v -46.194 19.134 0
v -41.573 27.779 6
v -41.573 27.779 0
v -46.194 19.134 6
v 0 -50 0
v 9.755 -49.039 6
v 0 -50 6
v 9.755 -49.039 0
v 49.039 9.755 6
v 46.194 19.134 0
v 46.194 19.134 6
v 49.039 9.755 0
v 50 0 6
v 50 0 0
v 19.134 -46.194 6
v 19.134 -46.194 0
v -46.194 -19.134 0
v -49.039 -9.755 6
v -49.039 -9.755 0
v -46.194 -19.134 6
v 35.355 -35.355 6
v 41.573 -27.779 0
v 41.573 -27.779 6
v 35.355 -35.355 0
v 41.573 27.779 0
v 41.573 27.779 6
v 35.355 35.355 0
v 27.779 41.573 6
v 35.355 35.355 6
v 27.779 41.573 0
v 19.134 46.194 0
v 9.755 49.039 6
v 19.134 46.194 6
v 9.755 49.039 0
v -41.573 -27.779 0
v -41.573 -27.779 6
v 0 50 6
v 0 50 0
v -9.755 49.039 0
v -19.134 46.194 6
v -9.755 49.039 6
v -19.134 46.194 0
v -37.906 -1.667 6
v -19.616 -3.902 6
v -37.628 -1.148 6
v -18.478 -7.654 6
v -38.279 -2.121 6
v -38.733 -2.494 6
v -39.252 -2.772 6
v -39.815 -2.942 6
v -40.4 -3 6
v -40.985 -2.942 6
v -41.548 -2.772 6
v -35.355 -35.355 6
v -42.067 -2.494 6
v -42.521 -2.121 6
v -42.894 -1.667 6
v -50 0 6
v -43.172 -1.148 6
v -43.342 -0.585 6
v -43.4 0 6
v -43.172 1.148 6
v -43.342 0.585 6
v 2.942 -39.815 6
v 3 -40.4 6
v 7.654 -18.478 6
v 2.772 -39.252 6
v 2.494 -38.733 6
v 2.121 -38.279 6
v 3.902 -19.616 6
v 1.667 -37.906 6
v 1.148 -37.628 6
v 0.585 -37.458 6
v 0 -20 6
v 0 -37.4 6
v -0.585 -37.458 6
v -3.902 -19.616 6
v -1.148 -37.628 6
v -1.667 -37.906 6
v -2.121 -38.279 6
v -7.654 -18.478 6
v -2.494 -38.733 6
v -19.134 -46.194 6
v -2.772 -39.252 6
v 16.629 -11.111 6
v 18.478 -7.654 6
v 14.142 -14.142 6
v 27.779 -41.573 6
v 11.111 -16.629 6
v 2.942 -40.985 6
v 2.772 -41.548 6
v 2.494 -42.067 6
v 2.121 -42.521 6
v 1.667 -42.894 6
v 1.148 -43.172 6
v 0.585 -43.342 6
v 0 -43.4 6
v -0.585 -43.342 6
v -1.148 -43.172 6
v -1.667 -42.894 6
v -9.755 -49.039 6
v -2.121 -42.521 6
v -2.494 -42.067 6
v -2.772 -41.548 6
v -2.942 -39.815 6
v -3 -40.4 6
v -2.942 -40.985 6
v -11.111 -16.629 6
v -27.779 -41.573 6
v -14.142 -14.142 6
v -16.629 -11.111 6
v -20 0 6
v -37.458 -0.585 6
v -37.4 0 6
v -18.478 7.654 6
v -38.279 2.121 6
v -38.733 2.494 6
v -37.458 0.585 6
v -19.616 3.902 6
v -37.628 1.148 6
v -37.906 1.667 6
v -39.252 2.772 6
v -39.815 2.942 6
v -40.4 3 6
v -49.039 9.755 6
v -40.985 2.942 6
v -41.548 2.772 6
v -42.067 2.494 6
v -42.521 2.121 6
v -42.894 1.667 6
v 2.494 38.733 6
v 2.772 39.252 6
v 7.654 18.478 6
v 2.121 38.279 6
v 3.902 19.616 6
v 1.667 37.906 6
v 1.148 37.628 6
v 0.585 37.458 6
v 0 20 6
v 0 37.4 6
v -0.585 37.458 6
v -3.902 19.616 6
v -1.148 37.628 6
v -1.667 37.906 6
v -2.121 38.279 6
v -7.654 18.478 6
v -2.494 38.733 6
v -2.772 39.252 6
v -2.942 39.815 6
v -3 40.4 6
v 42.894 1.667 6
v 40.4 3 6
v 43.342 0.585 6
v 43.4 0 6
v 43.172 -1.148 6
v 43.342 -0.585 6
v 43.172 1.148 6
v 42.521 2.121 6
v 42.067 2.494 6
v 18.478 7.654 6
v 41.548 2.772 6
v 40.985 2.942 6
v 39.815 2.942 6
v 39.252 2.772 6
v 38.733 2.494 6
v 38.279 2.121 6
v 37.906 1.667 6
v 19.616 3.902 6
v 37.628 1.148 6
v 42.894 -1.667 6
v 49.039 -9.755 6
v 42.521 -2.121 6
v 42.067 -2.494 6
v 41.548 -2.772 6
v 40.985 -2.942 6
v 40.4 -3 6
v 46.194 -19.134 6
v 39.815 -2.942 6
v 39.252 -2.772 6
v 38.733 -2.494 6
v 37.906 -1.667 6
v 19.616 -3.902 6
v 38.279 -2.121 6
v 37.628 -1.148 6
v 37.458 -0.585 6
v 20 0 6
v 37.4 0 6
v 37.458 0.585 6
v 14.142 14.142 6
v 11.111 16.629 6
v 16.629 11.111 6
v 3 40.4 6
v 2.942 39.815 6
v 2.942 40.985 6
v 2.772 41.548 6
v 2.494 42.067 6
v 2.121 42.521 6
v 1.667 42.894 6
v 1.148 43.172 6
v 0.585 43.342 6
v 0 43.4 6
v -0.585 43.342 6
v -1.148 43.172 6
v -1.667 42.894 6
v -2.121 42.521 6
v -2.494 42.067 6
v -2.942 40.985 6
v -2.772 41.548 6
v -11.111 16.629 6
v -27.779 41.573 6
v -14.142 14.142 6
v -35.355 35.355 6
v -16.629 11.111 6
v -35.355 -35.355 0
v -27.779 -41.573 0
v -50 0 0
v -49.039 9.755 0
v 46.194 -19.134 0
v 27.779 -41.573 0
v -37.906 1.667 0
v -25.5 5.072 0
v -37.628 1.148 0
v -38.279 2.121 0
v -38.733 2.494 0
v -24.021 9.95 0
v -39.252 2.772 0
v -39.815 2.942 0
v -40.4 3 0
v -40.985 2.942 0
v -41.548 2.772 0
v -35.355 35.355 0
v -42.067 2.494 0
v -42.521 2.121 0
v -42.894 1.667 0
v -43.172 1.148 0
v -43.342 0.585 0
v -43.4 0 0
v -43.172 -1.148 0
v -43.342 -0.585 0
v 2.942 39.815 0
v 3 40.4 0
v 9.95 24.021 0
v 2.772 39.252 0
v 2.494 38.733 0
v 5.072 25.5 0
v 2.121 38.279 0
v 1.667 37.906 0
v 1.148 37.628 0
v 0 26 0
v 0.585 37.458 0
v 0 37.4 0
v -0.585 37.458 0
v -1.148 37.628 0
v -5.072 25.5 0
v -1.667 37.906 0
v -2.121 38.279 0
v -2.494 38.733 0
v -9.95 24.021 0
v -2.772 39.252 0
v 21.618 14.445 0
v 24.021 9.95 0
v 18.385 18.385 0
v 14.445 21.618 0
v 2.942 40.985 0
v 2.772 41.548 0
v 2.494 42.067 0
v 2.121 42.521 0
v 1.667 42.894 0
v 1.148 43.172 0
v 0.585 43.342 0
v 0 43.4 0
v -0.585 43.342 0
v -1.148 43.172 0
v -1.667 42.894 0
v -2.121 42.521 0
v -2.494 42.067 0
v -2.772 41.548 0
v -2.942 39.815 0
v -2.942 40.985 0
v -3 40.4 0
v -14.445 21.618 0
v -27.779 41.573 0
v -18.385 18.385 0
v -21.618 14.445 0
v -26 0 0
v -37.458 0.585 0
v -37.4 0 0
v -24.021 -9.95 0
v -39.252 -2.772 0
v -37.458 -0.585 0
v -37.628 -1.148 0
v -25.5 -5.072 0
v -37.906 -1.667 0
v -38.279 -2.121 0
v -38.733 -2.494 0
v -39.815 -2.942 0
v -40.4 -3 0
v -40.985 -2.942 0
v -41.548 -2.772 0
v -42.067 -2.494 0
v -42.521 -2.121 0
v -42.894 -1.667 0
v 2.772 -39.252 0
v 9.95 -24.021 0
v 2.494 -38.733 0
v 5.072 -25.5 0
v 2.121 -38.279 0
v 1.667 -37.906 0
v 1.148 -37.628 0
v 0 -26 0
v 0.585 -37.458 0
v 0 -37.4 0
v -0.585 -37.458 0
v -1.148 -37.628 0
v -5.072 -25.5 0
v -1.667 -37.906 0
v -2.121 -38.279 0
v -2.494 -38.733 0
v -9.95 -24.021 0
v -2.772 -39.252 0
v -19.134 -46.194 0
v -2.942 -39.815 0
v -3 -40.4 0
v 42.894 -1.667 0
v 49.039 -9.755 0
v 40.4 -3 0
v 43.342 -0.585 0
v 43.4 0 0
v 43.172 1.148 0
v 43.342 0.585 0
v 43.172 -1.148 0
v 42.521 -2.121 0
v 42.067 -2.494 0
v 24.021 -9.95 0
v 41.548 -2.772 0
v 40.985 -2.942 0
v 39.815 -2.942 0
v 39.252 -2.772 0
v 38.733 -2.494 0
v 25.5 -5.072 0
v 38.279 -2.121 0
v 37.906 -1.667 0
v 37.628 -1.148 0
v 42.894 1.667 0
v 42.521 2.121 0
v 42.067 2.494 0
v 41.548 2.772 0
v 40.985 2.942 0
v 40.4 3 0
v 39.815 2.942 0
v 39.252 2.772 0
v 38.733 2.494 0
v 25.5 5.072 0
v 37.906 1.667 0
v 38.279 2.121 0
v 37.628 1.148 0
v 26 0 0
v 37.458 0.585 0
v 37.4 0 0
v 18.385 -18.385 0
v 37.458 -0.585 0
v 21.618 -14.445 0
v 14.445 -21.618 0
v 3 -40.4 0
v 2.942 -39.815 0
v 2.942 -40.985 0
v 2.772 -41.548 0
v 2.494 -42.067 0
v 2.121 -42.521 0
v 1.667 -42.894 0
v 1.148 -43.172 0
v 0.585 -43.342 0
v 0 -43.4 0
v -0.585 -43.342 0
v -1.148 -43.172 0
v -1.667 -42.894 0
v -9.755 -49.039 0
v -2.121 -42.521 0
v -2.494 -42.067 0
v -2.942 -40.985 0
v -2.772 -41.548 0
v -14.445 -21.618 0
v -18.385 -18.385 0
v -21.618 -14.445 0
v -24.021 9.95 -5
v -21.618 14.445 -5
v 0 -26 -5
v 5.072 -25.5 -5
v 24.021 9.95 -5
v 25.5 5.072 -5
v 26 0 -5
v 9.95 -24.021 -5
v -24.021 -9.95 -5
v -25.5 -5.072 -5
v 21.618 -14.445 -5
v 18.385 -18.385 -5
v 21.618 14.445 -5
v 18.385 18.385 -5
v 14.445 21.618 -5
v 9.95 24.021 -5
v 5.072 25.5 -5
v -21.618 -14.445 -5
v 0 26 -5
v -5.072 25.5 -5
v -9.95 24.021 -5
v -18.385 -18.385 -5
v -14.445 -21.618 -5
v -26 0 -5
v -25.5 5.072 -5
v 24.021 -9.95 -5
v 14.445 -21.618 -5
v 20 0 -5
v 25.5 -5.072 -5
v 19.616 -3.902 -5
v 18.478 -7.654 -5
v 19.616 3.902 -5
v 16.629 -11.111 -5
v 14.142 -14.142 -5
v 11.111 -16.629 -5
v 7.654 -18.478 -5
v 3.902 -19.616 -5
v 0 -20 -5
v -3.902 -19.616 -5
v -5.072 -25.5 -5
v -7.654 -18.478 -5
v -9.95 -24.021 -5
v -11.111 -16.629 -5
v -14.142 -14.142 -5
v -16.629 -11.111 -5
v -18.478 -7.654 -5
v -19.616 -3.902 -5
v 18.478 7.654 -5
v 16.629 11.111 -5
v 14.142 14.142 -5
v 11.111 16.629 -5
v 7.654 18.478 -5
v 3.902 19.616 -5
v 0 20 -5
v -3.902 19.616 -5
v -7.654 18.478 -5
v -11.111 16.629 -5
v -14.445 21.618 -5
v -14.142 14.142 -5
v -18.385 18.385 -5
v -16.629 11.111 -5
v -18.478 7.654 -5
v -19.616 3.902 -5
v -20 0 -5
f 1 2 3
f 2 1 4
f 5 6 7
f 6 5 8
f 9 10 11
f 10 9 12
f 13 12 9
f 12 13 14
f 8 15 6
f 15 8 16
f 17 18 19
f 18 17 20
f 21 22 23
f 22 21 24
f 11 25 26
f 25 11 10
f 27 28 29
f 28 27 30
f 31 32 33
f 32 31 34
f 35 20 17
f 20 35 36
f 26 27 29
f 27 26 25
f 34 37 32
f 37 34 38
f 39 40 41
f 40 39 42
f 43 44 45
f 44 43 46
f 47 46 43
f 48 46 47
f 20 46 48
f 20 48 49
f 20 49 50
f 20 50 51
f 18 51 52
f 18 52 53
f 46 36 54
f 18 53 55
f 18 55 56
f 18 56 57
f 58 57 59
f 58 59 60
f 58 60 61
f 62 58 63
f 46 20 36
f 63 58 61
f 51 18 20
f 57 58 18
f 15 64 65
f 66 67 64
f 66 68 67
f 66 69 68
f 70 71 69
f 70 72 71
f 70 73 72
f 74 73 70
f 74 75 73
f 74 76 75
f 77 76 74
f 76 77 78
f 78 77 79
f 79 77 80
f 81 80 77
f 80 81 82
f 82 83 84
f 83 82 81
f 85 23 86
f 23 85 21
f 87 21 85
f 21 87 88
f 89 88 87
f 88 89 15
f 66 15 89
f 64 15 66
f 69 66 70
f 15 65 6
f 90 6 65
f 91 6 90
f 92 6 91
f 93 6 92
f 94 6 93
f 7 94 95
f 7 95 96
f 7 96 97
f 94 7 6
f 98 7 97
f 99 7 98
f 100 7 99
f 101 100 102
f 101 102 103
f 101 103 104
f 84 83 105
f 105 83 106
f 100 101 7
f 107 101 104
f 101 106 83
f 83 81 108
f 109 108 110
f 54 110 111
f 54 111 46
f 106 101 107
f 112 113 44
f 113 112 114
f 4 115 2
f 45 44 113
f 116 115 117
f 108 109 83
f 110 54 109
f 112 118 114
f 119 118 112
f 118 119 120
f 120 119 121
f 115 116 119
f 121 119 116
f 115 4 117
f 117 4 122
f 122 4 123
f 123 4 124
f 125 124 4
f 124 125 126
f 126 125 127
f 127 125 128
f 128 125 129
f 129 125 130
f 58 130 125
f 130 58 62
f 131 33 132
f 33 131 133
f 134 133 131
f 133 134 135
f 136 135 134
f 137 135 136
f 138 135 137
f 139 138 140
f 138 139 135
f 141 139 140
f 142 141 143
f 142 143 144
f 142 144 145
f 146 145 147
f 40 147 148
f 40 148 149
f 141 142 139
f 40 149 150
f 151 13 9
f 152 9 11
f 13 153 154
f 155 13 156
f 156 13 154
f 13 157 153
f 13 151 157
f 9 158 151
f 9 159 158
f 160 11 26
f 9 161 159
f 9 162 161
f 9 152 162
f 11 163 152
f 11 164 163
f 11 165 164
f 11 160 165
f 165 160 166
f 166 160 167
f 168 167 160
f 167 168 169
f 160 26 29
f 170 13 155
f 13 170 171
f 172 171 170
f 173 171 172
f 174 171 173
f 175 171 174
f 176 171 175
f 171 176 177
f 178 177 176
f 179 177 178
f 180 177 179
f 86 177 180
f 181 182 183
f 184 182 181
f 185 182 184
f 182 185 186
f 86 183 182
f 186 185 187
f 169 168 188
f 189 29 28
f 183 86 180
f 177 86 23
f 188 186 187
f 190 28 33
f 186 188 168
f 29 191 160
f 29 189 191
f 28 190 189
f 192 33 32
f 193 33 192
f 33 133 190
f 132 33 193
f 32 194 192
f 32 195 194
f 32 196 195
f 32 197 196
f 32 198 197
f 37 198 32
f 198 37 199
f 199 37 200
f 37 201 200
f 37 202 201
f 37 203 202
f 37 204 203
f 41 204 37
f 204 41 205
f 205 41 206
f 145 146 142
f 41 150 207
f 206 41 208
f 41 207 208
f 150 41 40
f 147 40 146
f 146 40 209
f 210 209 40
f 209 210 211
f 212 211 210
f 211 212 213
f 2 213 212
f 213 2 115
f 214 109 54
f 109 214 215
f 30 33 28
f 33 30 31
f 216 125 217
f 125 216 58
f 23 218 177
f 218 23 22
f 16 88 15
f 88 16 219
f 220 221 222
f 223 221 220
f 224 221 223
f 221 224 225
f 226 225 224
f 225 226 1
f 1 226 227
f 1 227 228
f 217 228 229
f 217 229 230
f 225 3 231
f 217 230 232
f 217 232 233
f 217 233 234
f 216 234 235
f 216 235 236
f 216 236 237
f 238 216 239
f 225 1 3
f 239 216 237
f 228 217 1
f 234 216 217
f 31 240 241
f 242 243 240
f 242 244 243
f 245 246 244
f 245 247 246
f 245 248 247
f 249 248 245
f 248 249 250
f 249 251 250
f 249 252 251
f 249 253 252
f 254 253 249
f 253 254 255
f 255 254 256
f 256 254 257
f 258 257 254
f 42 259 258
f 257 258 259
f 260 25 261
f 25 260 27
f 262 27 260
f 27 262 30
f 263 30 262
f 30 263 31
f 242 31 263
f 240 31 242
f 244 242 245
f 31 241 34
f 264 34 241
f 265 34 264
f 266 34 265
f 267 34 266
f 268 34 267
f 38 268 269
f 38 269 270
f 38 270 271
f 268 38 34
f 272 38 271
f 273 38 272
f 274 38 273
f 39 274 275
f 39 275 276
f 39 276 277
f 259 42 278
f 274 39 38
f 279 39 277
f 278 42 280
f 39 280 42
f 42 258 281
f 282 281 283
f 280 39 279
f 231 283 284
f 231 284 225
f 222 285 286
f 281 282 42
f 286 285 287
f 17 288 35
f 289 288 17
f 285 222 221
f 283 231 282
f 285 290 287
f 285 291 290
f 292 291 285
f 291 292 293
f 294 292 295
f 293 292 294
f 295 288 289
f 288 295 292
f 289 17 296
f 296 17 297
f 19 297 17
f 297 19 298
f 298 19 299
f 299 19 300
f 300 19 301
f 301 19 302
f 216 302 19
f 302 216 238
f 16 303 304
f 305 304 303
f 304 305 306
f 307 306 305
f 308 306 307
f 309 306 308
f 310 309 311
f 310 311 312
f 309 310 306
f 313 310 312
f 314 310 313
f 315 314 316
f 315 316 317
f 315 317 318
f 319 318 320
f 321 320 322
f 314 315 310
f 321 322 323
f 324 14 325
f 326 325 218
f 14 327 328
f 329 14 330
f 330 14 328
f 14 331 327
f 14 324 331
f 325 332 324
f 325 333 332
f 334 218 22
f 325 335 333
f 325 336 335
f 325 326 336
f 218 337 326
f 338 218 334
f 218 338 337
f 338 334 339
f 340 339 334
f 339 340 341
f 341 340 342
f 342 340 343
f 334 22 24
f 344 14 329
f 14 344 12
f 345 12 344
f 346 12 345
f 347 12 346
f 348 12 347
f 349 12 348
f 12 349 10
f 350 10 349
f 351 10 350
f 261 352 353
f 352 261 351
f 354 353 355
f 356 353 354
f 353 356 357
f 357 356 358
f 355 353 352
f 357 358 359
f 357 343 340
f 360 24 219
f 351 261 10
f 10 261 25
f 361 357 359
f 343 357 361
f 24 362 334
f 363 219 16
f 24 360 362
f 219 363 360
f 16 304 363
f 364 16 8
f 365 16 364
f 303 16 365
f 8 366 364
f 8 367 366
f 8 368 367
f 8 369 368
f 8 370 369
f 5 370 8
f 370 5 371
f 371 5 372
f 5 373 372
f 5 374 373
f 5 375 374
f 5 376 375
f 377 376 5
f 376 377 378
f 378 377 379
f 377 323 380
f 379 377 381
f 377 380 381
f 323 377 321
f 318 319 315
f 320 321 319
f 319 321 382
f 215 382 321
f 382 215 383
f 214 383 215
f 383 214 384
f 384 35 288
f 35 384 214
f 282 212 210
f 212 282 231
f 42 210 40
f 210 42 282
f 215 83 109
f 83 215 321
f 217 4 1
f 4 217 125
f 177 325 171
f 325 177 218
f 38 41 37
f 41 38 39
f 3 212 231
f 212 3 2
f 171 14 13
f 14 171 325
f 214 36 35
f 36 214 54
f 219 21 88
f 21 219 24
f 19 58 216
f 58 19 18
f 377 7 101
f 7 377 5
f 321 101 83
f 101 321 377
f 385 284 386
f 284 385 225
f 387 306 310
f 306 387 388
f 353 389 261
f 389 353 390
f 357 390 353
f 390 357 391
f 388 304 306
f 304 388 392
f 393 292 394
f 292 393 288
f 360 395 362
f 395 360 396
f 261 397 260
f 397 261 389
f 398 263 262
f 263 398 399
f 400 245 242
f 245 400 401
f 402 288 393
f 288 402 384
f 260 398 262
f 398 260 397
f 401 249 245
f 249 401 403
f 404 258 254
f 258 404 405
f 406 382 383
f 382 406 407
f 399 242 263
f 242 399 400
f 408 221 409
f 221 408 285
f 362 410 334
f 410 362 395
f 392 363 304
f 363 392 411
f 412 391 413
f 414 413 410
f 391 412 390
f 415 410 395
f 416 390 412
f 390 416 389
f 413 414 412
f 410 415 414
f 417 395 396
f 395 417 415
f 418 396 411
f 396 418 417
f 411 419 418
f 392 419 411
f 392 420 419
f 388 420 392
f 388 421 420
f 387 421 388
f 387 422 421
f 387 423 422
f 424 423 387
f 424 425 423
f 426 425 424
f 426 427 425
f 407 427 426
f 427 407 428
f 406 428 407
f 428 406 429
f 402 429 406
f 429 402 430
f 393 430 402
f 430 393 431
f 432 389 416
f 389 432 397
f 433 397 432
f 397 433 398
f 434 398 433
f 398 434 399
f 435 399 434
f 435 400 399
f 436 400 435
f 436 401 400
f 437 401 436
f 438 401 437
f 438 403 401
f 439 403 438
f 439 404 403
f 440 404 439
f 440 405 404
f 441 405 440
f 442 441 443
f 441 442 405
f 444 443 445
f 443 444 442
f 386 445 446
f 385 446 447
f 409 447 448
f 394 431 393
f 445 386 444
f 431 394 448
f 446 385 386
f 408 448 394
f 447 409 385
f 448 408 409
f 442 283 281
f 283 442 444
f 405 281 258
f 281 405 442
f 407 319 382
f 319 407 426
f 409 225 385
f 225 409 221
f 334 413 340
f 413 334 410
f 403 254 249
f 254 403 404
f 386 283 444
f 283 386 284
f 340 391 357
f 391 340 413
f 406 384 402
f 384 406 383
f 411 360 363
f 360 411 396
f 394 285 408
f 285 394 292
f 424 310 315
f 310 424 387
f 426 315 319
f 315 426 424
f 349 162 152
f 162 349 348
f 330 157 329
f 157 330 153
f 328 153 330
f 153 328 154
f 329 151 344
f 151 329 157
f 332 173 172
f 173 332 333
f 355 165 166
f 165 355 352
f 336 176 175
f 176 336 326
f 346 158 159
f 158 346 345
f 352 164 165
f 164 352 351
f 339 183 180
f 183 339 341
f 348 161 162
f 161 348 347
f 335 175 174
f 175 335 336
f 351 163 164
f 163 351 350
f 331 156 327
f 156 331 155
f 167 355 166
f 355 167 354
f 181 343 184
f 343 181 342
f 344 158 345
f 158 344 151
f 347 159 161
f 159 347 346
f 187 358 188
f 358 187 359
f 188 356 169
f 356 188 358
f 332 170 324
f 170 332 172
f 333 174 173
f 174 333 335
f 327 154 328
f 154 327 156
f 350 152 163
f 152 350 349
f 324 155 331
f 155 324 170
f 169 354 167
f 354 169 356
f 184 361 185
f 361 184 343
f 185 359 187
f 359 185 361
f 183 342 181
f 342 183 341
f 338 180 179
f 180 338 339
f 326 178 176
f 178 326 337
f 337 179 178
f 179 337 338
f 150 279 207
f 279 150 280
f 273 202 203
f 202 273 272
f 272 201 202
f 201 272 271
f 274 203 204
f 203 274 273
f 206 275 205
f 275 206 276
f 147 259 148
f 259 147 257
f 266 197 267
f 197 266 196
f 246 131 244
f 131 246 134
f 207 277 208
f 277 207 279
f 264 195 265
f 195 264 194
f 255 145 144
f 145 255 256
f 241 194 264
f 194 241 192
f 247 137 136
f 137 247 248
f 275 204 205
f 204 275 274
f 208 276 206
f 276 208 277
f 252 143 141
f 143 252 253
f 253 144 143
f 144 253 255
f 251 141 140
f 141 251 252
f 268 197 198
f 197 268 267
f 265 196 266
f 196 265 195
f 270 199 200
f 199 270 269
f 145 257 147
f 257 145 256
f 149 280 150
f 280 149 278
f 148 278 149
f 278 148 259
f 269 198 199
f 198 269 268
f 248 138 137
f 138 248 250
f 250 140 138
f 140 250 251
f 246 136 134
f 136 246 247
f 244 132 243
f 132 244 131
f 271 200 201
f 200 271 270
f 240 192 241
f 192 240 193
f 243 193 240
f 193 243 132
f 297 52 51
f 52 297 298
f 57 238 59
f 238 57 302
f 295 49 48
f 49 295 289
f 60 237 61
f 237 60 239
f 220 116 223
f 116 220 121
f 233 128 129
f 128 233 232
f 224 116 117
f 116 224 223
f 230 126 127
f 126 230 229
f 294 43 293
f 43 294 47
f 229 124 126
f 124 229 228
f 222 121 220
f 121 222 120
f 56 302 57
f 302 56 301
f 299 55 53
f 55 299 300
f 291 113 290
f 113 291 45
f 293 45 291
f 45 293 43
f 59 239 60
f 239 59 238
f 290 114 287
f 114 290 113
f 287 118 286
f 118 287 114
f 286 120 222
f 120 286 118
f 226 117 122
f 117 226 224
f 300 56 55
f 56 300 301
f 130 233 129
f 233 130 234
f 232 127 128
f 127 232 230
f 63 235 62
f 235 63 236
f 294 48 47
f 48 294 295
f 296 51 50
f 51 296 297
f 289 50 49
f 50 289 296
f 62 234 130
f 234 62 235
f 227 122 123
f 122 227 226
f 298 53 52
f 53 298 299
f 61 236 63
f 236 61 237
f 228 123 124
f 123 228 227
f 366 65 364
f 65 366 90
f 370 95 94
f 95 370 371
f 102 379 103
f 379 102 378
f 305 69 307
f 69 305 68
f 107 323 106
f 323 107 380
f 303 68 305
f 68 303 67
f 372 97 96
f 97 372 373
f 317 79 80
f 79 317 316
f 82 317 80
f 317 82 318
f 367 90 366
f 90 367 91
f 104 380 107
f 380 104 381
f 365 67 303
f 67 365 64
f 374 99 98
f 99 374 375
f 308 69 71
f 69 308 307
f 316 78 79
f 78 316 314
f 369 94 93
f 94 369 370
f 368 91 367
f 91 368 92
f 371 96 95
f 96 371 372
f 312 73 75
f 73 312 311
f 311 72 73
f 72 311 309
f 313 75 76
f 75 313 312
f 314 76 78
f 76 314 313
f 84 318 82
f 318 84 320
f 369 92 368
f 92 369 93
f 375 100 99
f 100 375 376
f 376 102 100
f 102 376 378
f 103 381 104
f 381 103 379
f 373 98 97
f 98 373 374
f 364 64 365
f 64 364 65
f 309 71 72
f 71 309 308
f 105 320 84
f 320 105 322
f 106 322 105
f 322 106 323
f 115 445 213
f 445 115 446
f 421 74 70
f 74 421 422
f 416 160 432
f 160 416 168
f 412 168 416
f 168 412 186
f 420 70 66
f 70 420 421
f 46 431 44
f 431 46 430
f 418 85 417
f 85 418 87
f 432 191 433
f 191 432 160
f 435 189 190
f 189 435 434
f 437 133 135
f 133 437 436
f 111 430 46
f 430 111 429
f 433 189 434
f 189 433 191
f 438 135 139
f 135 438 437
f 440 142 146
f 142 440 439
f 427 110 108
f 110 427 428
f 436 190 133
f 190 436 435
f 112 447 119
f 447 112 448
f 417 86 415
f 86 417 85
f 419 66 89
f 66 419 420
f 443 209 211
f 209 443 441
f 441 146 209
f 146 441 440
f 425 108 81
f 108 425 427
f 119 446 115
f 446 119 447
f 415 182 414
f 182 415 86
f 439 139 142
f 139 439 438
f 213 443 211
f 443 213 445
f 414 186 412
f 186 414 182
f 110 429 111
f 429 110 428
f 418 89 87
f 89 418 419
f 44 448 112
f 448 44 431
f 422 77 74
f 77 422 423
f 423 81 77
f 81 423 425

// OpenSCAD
$fn = 32;

// ----------------------------------------------------------------------
// Bolt-circle flange: 100 mm outside, 4 bolt holes, bore 40 mm
// ----------------------------------------------------------------------

// --- parameters (mm) ---
flange_d = 100;           // flange outside diameter
flange_t = 6;             // flange thickness
bolts = 4;                // number of bolt holes
bolt_d = 6;               // bolt clearance
bolt_r = 40.4;            // bolt circle radius
bore_d = 40;              // centre bore
spigot_d = 52;            // spigot diameter
spigot_h = 6;             // spigot height below the flange
sink = 1;                 // overlap into the flange

module body() {
  cylinder(h = flange_t, d = flange_d);
  /* spigot on the back face, sunk into the flange */
  translate([0, 0, -spigot_h + sink]) cylinder(h = spigot_h, d = spigot_d);
}

difference() {
  body();
  /* bolt circle */
  for (i = [0 : bolts - 1]) rotate([0, 0, i * 360 / bolts]) translate([bolt_r, 0, -spigot_h - 1]) cylinder(h = flange_t + spigot_h + 3, d = bolt_d);
  translate([0, 0, -spigot_h - 1]) cylinder(h = flange_t + spigot_h + 3, d = bore_d);
}
